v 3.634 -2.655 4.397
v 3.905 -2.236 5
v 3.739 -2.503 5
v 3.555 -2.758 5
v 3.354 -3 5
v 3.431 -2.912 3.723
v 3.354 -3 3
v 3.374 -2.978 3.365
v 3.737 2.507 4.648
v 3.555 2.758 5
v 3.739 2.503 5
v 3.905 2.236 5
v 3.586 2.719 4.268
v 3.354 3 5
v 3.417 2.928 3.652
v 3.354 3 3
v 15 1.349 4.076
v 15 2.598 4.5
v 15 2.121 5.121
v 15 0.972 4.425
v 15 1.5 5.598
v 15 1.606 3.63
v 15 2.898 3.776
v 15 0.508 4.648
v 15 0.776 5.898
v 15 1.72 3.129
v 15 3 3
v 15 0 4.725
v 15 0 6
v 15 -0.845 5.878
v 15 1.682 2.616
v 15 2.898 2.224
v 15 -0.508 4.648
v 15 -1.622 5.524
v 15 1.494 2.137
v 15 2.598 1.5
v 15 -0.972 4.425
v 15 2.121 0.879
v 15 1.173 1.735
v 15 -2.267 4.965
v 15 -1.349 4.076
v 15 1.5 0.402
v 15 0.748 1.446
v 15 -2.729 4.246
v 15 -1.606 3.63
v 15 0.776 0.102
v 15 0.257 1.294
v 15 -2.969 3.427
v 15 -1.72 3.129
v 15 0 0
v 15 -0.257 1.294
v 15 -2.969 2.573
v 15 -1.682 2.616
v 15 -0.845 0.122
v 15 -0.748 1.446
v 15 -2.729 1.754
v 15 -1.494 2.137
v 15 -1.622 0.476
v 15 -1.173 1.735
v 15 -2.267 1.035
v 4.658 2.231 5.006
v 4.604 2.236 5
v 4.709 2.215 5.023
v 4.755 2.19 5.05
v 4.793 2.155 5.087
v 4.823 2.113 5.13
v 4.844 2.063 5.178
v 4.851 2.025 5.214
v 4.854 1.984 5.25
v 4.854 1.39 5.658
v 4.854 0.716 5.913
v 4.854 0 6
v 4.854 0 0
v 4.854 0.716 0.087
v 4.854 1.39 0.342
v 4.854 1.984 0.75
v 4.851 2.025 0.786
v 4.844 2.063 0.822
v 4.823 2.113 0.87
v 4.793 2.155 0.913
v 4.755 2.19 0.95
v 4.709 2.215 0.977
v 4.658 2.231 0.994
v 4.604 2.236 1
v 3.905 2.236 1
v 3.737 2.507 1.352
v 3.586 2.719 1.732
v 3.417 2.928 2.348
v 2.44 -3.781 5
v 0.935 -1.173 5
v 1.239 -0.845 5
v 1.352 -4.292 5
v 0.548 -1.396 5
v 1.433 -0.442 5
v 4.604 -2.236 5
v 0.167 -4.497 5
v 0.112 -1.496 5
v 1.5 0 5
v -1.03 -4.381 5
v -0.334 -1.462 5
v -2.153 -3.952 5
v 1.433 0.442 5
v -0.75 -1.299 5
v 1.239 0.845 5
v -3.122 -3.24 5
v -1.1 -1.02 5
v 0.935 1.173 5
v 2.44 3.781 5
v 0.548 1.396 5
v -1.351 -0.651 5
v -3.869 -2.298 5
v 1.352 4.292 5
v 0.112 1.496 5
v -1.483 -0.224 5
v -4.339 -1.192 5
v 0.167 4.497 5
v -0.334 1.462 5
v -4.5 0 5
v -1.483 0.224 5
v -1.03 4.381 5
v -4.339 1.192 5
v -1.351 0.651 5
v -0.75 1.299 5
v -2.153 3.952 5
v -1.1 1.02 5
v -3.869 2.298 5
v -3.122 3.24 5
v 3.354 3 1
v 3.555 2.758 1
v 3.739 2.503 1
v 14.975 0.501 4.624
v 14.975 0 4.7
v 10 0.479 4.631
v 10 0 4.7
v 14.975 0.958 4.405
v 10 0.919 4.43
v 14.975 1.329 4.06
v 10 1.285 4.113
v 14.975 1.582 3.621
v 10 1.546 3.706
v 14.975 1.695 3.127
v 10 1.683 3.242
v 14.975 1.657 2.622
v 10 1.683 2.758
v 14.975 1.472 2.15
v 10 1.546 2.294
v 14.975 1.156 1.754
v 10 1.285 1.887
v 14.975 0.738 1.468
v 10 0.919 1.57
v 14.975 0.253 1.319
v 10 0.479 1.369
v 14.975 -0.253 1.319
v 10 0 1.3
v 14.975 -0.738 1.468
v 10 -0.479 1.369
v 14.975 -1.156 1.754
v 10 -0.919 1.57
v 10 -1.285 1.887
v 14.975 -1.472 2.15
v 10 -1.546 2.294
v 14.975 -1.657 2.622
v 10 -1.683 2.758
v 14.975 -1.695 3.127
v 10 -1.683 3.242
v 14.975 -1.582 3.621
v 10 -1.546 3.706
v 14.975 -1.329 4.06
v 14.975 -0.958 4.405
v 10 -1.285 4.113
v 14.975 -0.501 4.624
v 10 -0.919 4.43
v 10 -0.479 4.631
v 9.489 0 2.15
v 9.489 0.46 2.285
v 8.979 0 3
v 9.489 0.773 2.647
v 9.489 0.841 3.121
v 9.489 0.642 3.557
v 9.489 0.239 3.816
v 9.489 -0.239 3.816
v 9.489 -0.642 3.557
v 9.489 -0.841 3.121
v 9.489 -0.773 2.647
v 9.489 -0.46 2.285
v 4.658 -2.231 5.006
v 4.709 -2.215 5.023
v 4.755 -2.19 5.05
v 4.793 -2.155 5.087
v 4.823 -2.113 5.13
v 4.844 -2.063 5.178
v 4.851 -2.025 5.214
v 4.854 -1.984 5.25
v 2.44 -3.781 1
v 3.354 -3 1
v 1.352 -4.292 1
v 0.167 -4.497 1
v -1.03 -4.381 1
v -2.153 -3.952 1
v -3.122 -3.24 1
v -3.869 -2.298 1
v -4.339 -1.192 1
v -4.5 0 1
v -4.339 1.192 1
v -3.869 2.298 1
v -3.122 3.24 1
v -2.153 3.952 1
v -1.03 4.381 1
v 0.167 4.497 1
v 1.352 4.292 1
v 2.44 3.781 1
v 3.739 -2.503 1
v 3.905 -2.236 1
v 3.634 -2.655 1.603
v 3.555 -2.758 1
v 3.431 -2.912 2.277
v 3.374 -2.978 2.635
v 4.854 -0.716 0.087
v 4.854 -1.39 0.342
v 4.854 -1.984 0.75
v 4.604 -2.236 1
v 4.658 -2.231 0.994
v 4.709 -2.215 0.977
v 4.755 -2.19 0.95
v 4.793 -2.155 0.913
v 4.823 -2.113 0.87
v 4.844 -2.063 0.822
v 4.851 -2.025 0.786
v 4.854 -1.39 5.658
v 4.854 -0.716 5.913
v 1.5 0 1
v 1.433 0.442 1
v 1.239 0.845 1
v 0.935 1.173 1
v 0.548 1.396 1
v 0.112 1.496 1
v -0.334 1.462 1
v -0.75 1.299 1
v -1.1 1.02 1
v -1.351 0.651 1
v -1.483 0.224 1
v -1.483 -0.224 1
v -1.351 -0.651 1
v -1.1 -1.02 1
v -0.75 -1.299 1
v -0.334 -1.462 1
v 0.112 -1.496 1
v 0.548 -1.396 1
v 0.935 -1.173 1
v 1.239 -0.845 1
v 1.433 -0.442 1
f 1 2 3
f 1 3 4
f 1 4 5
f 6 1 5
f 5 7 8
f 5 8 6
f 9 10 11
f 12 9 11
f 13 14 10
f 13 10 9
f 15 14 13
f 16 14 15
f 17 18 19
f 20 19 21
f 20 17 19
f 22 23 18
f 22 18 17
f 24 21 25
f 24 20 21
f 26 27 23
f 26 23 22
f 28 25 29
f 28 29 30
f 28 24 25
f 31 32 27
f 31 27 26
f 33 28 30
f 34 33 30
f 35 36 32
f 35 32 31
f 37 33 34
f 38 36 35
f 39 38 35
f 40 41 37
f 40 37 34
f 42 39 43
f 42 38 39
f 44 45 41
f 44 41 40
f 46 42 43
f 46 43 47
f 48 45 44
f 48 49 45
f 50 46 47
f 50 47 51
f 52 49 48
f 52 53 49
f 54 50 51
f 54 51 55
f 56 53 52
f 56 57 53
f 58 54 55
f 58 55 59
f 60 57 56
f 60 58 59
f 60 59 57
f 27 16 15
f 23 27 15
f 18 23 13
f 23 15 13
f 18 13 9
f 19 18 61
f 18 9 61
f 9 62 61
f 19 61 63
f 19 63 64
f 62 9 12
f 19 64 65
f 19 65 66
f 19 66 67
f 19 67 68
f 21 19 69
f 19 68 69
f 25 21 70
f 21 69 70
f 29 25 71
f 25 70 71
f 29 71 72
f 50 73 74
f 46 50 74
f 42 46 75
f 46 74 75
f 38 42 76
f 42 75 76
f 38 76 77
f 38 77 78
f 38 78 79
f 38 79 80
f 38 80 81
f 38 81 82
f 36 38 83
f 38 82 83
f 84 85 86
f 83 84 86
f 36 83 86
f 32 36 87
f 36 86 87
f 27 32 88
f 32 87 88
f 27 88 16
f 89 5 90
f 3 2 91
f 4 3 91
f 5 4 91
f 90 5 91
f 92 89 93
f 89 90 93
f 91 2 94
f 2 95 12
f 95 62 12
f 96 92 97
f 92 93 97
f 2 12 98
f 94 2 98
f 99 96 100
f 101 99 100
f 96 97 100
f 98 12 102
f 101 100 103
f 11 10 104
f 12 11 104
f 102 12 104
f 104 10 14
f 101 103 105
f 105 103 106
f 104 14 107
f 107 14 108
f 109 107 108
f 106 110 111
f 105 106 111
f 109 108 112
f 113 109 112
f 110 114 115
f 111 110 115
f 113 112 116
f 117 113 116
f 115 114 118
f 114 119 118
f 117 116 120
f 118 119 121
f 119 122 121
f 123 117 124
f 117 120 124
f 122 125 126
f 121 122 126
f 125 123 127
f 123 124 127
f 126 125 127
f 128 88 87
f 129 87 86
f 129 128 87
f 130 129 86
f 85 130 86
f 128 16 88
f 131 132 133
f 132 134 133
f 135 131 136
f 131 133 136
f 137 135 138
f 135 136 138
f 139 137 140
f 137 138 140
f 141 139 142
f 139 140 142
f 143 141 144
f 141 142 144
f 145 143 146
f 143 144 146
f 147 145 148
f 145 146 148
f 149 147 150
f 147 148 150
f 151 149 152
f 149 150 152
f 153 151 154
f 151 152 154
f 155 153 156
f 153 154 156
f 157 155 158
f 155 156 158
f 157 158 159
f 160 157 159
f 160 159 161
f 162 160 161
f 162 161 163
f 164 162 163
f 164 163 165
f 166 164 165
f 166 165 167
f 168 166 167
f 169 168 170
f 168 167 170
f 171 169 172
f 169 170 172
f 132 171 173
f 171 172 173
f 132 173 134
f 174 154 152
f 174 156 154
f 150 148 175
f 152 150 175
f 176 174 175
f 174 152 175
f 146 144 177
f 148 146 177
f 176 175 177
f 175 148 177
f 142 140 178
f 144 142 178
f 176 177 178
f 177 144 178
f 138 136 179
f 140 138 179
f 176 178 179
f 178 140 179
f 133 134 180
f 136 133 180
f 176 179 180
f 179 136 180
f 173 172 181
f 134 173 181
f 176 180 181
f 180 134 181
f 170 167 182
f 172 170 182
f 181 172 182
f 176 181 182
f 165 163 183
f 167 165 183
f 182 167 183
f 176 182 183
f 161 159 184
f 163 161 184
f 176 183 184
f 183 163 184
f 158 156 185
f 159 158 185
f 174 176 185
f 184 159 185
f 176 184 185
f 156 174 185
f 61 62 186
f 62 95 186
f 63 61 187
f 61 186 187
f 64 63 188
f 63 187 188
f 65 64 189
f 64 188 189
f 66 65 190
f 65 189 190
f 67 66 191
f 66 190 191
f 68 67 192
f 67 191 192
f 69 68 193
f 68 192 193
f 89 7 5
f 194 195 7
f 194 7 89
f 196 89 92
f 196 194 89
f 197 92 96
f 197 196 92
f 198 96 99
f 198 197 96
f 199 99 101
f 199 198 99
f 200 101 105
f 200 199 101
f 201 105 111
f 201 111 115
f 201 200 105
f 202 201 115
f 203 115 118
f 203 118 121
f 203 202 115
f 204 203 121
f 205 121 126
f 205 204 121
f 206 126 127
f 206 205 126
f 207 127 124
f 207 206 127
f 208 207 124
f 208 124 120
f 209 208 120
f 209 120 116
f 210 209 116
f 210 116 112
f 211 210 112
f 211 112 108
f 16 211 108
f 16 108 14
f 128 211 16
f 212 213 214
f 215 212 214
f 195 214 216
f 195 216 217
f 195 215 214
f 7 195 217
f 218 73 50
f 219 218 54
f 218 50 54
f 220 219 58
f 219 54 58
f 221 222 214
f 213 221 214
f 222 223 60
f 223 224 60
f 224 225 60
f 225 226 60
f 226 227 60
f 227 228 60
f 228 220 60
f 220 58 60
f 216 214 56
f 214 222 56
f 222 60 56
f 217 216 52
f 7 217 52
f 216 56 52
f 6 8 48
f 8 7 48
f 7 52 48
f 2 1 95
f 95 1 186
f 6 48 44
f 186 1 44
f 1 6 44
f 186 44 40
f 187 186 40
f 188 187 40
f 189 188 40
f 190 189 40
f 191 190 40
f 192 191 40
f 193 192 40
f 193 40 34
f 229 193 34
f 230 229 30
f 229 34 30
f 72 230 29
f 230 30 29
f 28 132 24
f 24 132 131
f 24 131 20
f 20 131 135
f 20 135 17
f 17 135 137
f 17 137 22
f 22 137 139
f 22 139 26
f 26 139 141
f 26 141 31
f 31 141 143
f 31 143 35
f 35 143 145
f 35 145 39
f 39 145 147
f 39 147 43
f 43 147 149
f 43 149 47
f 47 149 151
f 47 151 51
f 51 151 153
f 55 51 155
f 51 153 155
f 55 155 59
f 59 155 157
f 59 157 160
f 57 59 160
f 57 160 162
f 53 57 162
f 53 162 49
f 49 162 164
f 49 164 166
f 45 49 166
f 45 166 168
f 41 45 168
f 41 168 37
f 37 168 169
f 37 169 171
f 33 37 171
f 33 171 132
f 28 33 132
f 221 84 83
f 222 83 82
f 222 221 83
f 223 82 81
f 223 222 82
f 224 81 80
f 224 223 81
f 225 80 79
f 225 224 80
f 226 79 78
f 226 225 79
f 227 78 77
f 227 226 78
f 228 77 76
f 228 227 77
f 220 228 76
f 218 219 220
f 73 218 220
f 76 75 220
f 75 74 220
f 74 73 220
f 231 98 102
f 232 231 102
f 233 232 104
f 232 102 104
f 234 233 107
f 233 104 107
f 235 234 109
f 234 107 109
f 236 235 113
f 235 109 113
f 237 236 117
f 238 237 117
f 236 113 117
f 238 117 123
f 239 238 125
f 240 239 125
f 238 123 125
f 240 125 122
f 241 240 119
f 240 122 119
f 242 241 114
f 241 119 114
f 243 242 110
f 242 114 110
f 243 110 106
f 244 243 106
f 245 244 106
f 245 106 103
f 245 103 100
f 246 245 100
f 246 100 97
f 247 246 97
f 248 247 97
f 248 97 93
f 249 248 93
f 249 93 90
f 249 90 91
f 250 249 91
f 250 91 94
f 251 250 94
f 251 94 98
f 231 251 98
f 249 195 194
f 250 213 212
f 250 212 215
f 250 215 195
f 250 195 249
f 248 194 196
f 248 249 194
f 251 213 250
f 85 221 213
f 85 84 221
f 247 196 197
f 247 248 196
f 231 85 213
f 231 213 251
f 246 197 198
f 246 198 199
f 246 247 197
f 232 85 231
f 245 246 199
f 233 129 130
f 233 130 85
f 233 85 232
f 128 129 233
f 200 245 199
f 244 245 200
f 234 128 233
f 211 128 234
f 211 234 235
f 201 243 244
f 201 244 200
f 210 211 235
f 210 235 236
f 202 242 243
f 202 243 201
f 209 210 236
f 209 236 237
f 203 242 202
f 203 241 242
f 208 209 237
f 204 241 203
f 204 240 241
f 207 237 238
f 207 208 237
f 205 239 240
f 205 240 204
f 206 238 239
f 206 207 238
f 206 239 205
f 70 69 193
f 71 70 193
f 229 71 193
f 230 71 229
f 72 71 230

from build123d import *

# Parameters (mm, degrees)
BOSS_EXTRU_2_DEPTH         = 6
ENL_V_START                = -1
ENL_V_MAT_EXTRU_1_DEPTH    = 1
ENL_V_MAT_EXTRU_2_DEPTH    = 1
CONG_4_R                   = 3
CONG_5_R                   = 0.25
D_GAGEMENT_M31_D           = 3.4
D_GAGEMENT_M31_DEPTH       = 5
D_GAGEMENT_M31_CSINK_D     = 3.45
D_GAGEMENT_M31_CSINK_ANGLE = 90
D_GAGEMENT_M31_TIP         = 1.021463052
ESQUISSE9_R                = 1.5
ENL_V_MAT_EXTRU_3_DEPTH    = 17.439282372


with BuildPart() as part:
    # Esquisse1 → Boss.-Extru.2 (new body)
    with BuildSketch(Plane.XY):
        with BuildLine():
            Line((3.354101966, 3), (15, 3))
            Line((15, 3), (15, -3))
            Line((15, -3), (3.354101966, -3))
            ThreePointArc((3.354101966, -3), (-4.5, 0), (3.354101966, 3))
        make_face()
    extrude(amount=BOSS_EXTRU_2_DEPTH)

    # Esquisse5 → Enlèv. mat.-Extru.1 (cut)
    with BuildSketch(Plane.XY.offset(6).offset(ENL_V_START)):
        with BuildLine():
            Line((3.354101966, 3), (4.854101966, 3))
            Line((4.854101966, 3), (4.854101966, -3))
            Line((4.854101966, -3), (3.354101966, -3))
            ThreePointArc((3.354101966, -3), (-4.5, 0), (3.354101966, 3))
        make_face()
    extrude(amount=ENL_V_MAT_EXTRU_1_DEPTH, mode=Mode.SUBTRACT)

    # Esquisse6 → Enlèv. mat.-Extru.2 (cut)
    with BuildSketch(Plane(origin=(0, 0, 0), x_dir=(-1, 0, 0), z_dir=(0, 0, -1))):
        with BuildLine():
            Line((-3.354101966, 3), (-4.854101966, 3))
            Line((-4.854101966, 3), (-4.854101966, -3))
            Line((-4.854101966, -3), (-3.354101966, -3))
            ThreePointArc((-3.354101966, -3), (4.5, 0), (-3.354101966, 3))
        make_face()
    extrude(amount=-ENL_V_MAT_EXTRU_2_DEPTH, mode=Mode.SUBTRACT)

    # Congé4
    # the kernel refuses this fillet: 3 mm, written as the material it takes off along each edge
    with BuildSketch(Plane(origin=(22.5, -3, 6), x_dir=(0, 1, 0), z_dir=(-1, 0, 0))) as cong_4_piece_1_section:
        with BuildLine():
            CenterArc((CONG_4_R, CONG_4_R), CONG_4_R, 180, 90)
            Line((0, CONG_4_R), (0, 0))
            Line((0, 0), (CONG_4_R, 0))
        make_face()
    cong_4_piece_1 = extrude(amount=25.145898034, mode=Mode.PRIVATE)
    cong_4_piece_1 = cong_4_piece_1 - Plane(origin=(0, 0, 5.599963302), x_dir=(0.7453559924999289, -0.6666666666666679, 0), z_dir=(0, 0, -1)) * Cylinder(4.5, 63, mode=Mode.PRIVATE)
    add(cong_4_piece_1, mode=Mode.SUBTRACT)
    with BuildSketch(Plane(origin=(22.5, -3, 0), x_dir=(0, 1, 0), z_dir=(-1, 0, 0))) as cong_4_piece_2_section:
        with BuildLine():
            CenterArc((CONG_4_R, -CONG_4_R), CONG_4_R, 90, 90)
            Line((0, -CONG_4_R), (0, 0))
            Line((0, 0), (CONG_4_R, 0))
        make_face()
    cong_4_piece_2 = extrude(amount=25.145898034, mode=Mode.PRIVATE)
    cong_4_piece_2 = cong_4_piece_2 - Plane(origin=(0, 0, 0.400036698), x_dir=(0.7453559924999289, -0.6666666666666679, 0), z_dir=(0, 0, -1)) * Cylinder(4.5, 63, mode=Mode.PRIVATE)
    add(cong_4_piece_2, mode=Mode.SUBTRACT)
    with BuildSketch(Plane(origin=(-2.645898034, 3, 0), x_dir=(0, 0, 1), z_dir=(1, 0, 0))) as cong_4_piece_3_section:
        with BuildLine():
            CenterArc((CONG_4_R, CONG_4_R), CONG_4_R, 180, 90)
            Line((0, CONG_4_R), (0, 0))
            Line((0, 0), (CONG_4_R, 0))
        make_face()
    cong_4_piece_3 = extrude(amount=25.145898034, mode=Mode.PRIVATE)
    cong_4_piece_3 = cong_4_piece_3 - Plane(origin=(0, 0, 1.508382446), x_dir=(0.7453559924999289, -0.6666666666666679, 0), z_dir=(0, 0, -1)) * Cylinder(4.5, 63, mode=Mode.PRIVATE)
    add(cong_4_piece_3, mode=Mode.SUBTRACT)
    with BuildSketch(Plane(origin=(-2.645898034, 3, 6), x_dir=(0, 0, -1), z_dir=(1, 0, 0))) as cong_4_piece_4_section:
        with BuildLine():
            CenterArc((CONG_4_R, -CONG_4_R), CONG_4_R, 90, 90)
            Line((0, -CONG_4_R), (0, 0))
            Line((0, 0), (CONG_4_R, 0))
        make_face()
    cong_4_piece_4 = extrude(amount=25.145898034, mode=Mode.PRIVATE)
    cong_4_piece_4 = cong_4_piece_4 - Plane(origin=(0, 0, 4.491617554), x_dir=(0.7453559924999289, -0.6666666666666679, 0), z_dir=(0, 0, -1)) * Cylinder(4.5, 63, mode=Mode.PRIVATE)
    add(cong_4_piece_4, mode=Mode.SUBTRACT)

    # Congé5
    cong_5_edges = [part.edges().sort_by_distance(p)[0] for p in [
        (4.854101966, 0, 5),
        (4.854101966, 0, 1),
    ]]
    fillet(cong_5_edges, radius=CONG_5_R)

    # Dégagement M31
    with Locations(Plane(origin=(15, 0, 0), x_dir=(0, 0, -1), z_dir=(1, 0, 0))):
        with Locations((-3, 0)):
            CounterSinkHole(D_GAGEMENT_M31_D / 2, D_GAGEMENT_M31_CSINK_D / 2, depth=D_GAGEMENT_M31_DEPTH, counter_sink_angle=D_GAGEMENT_M31_CSINK_ANGLE)
            with Locations((0, 0, -(D_GAGEMENT_M31_DEPTH + D_GAGEMENT_M31_TIP / 2))):  # 118° drill point
                Cone(0, D_GAGEMENT_M31_D / 2, D_GAGEMENT_M31_TIP, mode=Mode.SUBTRACT)

    # Esquisse9 → Enlèv. mat.-Extru.3 (cut, through all)
    with BuildSketch(Plane.XY.offset(5)):
        Circle(ESQUISSE9_R)
    extrude(amount=-ENL_V_MAT_EXTRU_3_DEPTH, mode=Mode.SUBTRACT)


solid = part.part
